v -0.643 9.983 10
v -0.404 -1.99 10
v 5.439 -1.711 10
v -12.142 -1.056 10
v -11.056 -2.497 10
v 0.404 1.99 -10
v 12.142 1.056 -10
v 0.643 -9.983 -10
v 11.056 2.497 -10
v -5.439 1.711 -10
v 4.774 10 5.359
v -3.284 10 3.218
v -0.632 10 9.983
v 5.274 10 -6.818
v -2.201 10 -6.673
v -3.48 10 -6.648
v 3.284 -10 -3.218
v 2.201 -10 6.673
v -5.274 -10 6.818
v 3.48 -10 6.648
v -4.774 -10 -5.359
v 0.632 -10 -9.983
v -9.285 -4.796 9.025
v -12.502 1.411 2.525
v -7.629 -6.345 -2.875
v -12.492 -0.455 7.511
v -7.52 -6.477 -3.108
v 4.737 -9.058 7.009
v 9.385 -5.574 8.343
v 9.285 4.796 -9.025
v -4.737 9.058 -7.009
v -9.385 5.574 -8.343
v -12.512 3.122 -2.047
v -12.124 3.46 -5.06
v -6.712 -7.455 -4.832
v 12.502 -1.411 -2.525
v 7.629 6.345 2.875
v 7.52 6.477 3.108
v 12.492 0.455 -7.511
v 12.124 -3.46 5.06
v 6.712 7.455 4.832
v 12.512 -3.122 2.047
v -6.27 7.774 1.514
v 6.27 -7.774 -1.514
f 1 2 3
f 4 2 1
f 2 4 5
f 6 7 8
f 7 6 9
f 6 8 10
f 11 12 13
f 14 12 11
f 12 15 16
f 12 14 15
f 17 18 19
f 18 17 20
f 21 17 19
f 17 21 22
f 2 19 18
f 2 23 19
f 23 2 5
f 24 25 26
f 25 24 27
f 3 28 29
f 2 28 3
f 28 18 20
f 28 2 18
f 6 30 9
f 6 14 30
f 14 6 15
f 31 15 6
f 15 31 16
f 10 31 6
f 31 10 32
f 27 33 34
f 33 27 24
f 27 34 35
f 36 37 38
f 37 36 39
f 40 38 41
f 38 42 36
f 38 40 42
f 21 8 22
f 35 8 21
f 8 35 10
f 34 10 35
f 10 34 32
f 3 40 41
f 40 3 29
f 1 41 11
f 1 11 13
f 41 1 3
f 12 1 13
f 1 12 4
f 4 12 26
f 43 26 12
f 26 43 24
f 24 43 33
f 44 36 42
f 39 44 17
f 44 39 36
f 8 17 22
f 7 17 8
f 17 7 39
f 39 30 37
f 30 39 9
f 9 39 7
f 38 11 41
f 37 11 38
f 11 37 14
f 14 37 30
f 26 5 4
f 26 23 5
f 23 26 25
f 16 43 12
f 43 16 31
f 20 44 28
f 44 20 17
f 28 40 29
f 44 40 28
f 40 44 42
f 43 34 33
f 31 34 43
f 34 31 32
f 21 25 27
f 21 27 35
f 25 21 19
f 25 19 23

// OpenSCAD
intersection_for(i = [ [  0,  0,   0],
                        [ 10, 20, 300],
                        [200, 40,  57],
                        [ 20, 88,  57] ])
{
    rotate(i)
    cube([100, 20, 20], center = true);
}
